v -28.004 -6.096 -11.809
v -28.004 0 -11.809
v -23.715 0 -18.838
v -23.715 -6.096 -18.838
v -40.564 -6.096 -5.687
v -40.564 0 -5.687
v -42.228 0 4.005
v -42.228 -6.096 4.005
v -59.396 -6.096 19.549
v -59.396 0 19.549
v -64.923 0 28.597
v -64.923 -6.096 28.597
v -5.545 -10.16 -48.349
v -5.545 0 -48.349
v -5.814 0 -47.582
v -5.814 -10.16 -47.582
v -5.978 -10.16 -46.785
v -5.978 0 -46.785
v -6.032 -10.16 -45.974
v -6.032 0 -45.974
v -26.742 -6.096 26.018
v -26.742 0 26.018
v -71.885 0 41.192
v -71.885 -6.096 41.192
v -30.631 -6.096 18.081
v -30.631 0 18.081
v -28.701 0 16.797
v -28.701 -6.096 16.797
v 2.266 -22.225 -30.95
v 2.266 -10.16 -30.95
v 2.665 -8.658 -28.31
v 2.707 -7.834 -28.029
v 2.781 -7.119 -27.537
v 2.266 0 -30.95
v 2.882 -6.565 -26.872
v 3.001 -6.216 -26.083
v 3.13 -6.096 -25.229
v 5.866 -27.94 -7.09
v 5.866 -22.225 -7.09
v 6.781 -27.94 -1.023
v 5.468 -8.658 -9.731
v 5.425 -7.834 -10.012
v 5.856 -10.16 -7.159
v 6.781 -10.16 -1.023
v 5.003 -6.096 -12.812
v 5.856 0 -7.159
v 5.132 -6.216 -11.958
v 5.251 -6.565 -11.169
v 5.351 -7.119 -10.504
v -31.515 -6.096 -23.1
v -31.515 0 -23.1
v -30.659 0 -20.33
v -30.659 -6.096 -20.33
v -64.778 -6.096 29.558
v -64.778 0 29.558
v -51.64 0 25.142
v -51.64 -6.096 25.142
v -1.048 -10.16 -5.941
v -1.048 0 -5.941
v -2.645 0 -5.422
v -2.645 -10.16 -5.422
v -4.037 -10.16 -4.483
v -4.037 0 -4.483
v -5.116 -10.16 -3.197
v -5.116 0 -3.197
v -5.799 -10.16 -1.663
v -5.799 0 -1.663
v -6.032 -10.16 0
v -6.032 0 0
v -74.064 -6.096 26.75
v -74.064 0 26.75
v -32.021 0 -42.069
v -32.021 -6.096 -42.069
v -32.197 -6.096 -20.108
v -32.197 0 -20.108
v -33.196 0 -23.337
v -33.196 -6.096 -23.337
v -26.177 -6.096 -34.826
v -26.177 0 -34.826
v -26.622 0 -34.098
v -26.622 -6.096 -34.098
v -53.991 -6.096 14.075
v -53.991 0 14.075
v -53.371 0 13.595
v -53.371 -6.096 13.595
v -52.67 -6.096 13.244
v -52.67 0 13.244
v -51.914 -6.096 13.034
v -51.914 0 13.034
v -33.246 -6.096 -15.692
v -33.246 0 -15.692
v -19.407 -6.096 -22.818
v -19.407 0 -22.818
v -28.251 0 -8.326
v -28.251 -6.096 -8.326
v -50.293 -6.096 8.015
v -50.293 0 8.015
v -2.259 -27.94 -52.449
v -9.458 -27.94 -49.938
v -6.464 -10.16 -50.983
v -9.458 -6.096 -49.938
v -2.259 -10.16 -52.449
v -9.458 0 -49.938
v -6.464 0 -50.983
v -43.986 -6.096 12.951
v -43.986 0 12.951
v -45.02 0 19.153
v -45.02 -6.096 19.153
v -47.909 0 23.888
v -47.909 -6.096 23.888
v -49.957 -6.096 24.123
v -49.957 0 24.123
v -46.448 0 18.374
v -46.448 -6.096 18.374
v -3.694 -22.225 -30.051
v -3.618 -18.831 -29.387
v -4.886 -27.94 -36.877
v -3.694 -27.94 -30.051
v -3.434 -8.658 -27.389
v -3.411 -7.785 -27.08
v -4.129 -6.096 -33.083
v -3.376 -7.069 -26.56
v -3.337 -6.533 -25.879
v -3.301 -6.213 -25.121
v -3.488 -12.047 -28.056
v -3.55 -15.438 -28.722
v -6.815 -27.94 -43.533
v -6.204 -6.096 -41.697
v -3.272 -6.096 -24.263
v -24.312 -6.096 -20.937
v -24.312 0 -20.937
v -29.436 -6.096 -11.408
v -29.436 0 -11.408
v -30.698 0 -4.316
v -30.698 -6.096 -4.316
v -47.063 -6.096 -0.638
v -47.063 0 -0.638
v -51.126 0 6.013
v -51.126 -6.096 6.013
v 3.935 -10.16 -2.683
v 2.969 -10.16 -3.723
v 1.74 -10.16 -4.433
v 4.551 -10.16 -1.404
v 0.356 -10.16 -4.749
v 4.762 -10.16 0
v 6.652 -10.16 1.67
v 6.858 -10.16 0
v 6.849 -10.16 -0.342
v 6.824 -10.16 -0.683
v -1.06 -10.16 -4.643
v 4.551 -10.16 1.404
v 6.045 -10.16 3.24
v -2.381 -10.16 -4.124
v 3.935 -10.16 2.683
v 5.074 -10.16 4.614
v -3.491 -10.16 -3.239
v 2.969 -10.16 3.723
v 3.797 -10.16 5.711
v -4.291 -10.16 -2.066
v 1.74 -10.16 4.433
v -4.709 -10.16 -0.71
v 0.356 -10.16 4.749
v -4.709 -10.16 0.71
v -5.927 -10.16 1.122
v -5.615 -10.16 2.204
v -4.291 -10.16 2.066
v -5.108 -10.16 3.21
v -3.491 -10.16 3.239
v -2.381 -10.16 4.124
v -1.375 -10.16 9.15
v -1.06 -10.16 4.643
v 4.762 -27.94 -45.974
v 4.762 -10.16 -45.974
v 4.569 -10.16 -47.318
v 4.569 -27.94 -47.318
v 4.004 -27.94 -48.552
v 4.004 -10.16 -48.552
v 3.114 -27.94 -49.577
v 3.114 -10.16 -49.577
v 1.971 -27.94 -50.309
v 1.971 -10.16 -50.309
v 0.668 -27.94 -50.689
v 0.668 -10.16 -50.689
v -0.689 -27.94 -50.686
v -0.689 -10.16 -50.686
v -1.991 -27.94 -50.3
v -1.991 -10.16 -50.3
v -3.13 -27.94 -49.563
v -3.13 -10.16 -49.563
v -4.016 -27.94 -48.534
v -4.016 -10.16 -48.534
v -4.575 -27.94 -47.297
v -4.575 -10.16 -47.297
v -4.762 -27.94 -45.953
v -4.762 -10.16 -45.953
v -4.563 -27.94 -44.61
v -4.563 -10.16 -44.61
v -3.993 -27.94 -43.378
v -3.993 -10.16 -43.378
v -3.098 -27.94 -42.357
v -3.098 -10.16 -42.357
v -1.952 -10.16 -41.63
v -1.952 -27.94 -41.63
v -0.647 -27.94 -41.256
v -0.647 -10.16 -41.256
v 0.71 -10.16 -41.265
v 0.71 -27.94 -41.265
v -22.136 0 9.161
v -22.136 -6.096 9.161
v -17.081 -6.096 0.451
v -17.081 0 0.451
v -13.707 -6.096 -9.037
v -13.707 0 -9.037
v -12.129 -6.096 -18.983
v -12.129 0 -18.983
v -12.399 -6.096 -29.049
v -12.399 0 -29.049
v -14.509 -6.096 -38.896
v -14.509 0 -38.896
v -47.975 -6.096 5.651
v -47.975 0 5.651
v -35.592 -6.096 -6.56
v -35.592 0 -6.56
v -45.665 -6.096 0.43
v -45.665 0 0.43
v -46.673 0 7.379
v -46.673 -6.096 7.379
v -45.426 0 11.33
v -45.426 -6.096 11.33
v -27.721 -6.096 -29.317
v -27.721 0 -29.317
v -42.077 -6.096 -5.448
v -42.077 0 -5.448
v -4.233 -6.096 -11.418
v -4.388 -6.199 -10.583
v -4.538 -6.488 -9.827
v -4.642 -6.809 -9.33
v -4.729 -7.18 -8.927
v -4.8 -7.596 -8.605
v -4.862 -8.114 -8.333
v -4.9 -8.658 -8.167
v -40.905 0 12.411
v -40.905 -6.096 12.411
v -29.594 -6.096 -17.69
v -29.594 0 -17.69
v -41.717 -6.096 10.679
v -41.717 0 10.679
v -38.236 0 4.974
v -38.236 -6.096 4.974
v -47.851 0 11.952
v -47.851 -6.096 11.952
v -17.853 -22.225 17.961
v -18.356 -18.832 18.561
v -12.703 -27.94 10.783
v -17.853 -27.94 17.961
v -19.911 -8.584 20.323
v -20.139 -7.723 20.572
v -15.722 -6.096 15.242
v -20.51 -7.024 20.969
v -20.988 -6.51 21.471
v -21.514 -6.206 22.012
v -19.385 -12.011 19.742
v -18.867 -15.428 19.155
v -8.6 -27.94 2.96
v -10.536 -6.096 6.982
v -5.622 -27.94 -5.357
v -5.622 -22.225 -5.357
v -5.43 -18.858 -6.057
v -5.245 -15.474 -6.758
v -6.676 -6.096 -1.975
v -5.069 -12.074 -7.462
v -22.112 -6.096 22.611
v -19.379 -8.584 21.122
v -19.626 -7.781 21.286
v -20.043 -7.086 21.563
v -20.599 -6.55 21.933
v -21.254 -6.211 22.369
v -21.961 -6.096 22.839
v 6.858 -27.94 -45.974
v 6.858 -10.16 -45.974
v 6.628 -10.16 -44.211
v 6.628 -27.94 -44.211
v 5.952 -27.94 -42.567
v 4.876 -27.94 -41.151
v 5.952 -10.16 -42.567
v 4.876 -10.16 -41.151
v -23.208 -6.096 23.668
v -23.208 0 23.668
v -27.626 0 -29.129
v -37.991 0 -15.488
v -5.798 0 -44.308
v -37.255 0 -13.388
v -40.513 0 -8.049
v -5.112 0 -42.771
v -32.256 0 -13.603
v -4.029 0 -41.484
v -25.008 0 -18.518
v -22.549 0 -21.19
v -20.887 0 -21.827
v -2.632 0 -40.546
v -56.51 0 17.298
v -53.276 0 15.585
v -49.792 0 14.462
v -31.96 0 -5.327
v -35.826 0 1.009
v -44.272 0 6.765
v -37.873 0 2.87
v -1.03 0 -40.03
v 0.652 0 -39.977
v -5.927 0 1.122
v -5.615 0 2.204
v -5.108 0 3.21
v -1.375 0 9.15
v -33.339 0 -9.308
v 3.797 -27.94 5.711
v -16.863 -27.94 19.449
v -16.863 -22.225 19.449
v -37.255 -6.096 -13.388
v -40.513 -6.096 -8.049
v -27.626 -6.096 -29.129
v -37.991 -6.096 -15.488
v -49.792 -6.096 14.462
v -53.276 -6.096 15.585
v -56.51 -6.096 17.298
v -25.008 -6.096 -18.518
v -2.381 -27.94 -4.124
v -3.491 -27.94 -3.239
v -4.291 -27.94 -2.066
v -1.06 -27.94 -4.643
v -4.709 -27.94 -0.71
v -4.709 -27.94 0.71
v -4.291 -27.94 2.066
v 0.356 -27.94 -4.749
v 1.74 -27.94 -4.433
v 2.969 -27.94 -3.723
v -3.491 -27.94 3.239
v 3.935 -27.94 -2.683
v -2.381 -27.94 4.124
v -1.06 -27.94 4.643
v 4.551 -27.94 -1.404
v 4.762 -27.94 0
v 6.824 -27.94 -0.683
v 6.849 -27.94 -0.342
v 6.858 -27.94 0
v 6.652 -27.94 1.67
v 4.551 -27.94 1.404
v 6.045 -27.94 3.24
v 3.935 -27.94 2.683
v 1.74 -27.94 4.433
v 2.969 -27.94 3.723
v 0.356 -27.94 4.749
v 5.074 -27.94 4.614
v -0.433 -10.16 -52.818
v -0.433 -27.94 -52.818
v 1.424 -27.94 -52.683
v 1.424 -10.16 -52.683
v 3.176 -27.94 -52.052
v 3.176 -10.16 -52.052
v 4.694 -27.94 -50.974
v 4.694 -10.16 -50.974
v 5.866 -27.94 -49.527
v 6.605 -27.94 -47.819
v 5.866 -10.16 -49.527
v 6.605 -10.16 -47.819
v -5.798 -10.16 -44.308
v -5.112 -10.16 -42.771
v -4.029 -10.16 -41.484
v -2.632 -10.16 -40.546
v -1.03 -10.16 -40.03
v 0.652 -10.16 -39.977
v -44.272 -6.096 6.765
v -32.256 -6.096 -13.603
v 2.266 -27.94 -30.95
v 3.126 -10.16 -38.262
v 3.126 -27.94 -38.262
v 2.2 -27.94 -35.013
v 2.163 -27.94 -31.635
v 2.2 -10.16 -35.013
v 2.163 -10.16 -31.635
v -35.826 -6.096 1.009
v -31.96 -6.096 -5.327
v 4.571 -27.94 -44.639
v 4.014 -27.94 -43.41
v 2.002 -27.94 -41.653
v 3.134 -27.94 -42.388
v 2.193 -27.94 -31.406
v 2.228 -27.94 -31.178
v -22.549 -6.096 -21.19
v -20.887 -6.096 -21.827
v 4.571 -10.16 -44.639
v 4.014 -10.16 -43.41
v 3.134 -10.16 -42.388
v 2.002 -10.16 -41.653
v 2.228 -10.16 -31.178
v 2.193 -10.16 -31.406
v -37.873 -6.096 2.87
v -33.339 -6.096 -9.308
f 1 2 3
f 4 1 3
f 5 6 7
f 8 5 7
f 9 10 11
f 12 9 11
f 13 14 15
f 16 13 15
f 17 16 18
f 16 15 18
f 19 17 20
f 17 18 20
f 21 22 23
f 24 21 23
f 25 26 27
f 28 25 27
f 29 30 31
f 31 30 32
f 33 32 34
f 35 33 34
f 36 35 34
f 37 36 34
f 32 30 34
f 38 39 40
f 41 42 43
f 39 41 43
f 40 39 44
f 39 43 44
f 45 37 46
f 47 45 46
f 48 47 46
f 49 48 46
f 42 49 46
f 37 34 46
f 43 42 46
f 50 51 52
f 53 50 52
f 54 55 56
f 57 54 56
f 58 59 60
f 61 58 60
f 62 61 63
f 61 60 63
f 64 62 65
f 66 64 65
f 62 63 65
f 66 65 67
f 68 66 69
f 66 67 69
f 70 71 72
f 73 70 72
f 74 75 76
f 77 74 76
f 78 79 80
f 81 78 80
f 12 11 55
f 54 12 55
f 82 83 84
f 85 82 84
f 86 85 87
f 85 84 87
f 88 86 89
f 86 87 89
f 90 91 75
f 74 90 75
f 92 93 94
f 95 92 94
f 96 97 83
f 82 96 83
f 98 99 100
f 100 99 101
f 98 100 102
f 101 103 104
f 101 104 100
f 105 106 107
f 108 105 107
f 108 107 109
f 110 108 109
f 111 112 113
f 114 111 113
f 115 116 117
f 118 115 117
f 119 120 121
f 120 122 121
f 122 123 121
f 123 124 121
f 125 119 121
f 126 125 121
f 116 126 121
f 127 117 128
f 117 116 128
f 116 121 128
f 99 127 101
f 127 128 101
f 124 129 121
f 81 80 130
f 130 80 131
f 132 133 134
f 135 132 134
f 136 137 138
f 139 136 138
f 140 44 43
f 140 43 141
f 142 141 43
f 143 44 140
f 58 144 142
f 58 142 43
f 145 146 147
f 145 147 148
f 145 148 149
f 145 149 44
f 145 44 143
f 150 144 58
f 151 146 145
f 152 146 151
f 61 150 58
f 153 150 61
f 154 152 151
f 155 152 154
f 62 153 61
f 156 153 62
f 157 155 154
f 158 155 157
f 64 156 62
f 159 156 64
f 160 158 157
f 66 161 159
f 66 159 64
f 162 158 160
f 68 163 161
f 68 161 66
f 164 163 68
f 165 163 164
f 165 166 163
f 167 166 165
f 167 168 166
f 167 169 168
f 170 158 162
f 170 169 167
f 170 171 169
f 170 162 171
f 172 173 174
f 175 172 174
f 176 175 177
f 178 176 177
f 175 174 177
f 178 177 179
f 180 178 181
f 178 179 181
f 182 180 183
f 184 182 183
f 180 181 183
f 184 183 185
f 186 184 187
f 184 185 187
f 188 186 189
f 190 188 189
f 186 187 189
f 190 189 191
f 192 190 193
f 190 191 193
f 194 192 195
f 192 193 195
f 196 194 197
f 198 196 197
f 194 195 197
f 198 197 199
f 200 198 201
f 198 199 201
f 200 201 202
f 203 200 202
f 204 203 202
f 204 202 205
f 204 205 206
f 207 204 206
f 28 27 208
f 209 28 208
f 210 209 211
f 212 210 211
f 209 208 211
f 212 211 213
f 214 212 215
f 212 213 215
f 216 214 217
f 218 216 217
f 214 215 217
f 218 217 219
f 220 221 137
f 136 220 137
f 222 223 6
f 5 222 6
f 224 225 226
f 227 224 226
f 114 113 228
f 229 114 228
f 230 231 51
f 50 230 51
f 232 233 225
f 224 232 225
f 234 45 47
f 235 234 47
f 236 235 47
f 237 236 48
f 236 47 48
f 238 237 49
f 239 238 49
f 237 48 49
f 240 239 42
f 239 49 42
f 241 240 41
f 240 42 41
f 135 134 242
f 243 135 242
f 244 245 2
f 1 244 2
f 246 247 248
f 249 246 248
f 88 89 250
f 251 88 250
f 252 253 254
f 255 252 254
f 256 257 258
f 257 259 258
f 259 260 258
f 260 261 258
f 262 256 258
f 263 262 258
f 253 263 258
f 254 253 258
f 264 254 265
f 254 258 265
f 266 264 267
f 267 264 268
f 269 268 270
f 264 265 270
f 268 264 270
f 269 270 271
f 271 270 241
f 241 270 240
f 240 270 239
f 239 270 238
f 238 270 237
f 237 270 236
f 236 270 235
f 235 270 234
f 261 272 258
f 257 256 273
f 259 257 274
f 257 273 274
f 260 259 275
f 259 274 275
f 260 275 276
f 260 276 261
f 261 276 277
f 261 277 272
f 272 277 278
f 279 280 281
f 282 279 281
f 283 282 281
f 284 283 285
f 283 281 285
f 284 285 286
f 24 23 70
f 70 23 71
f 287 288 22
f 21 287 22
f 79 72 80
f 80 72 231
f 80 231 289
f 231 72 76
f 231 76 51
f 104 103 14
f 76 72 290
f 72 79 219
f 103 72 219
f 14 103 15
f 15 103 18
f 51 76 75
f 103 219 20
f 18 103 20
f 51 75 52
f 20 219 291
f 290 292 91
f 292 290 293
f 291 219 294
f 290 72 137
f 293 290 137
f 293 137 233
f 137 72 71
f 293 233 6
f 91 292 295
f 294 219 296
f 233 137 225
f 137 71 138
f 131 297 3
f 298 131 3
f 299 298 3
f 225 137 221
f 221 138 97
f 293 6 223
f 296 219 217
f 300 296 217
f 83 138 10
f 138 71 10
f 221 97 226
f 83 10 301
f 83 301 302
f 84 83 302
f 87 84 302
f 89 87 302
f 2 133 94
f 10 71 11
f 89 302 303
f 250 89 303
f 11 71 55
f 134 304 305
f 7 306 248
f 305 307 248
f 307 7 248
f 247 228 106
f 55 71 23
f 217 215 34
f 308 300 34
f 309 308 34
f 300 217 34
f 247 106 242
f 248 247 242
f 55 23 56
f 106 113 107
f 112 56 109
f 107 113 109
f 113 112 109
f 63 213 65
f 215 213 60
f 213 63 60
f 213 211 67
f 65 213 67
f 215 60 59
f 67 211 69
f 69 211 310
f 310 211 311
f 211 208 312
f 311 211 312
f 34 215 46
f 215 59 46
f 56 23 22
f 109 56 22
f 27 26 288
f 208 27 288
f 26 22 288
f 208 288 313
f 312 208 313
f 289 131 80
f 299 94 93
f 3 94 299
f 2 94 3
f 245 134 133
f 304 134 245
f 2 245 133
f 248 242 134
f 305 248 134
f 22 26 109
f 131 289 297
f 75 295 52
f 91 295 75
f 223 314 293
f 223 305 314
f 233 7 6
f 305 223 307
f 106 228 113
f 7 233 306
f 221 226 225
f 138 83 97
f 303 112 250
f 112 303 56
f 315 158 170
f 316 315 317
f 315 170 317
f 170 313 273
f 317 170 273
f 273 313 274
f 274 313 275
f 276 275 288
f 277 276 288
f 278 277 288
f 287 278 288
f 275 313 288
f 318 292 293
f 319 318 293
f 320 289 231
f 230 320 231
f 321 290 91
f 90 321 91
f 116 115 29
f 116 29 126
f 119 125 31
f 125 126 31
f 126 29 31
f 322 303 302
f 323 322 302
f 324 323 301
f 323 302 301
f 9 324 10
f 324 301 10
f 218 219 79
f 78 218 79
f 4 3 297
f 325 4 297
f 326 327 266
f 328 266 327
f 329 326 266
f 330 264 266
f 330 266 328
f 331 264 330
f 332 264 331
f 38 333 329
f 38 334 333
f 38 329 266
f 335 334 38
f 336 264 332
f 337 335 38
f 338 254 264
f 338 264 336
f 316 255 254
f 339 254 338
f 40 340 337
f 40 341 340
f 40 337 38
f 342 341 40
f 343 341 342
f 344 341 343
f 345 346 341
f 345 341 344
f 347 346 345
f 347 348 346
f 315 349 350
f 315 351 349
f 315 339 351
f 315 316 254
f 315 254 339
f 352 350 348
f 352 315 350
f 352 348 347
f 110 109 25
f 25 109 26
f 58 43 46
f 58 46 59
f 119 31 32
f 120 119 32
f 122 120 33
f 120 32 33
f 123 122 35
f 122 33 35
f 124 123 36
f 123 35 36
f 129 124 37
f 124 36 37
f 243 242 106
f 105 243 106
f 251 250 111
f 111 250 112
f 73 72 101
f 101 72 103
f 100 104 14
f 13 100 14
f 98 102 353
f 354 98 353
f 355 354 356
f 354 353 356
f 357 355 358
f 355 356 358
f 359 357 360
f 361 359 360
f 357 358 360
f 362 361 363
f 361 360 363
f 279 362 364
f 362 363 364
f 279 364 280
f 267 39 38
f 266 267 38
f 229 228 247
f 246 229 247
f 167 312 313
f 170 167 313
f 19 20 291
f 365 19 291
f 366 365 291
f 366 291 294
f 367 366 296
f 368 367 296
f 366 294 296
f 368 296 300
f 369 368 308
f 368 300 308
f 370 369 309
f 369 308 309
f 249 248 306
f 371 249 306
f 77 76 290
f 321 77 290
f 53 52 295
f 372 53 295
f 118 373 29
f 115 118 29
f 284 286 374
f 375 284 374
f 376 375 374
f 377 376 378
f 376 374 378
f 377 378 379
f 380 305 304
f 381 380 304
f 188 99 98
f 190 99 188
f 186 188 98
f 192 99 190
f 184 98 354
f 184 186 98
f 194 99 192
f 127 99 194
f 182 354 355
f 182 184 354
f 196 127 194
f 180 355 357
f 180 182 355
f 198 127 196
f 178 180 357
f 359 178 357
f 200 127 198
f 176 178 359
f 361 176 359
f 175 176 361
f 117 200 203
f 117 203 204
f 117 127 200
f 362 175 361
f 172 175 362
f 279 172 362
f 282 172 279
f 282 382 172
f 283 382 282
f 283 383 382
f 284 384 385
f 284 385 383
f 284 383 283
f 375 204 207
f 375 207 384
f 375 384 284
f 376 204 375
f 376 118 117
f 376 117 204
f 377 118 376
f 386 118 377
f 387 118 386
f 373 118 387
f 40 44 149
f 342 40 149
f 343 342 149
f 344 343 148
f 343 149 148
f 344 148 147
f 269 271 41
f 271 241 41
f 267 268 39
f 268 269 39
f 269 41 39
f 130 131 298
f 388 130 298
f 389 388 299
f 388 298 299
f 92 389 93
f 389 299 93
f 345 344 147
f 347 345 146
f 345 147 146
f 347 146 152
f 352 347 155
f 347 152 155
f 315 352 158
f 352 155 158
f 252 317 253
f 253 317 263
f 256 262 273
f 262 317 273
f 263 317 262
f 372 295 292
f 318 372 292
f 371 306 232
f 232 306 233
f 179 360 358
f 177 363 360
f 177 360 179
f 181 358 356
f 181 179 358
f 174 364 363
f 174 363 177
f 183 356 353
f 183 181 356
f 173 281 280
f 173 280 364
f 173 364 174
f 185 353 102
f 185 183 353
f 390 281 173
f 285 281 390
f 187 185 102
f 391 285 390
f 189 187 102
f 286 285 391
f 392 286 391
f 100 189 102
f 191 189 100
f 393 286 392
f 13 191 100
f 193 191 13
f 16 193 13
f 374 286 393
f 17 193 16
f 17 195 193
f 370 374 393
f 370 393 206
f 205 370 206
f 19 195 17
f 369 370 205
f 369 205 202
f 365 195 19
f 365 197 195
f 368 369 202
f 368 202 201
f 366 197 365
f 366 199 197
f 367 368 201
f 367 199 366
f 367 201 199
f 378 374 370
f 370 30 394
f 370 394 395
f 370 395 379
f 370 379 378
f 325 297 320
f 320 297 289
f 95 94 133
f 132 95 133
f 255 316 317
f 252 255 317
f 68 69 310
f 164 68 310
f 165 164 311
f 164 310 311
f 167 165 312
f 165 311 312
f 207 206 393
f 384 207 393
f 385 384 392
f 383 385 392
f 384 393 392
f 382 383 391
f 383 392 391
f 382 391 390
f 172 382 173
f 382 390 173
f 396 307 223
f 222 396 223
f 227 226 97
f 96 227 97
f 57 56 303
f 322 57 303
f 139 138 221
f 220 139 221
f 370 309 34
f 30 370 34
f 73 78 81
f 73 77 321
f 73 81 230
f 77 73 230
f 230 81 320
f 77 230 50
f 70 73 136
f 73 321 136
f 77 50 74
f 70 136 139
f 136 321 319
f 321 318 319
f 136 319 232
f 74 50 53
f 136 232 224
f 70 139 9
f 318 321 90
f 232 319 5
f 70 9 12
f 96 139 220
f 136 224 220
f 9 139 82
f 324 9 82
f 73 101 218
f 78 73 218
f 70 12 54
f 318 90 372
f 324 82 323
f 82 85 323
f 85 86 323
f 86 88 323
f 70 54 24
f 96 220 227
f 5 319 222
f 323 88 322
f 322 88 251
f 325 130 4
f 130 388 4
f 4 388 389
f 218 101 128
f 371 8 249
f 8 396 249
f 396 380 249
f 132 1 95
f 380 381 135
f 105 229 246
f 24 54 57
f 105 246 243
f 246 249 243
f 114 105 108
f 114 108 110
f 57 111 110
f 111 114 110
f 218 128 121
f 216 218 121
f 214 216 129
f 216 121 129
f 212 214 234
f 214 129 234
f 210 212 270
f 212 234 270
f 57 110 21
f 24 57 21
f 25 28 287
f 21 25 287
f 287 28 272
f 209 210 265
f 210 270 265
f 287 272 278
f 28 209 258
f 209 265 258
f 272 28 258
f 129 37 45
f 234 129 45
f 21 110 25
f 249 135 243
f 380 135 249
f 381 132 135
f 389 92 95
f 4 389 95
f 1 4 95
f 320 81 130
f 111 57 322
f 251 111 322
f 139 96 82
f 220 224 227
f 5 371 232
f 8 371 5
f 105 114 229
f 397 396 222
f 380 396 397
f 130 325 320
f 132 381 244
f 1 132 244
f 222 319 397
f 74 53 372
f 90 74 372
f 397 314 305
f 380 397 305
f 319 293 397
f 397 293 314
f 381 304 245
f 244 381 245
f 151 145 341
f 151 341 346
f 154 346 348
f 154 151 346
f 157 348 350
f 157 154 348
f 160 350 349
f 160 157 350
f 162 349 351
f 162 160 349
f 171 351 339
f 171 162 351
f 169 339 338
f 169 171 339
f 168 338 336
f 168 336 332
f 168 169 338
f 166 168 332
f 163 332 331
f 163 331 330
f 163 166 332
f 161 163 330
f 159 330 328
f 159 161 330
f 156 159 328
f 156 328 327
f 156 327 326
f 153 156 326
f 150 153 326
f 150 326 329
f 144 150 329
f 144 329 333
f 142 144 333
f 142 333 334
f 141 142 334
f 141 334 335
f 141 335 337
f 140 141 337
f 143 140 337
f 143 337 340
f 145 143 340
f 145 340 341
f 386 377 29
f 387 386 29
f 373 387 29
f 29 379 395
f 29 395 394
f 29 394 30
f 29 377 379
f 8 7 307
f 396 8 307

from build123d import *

# Parameters (mm, degrees)
F1_DEPTH = 6.096
F0_R     = 4.7625
F2_DEPTH = 27.94
F3_R     = 4.7625
F4_DEPTH = 10.16
F6_DEPTH = 25.4
F8_DEPTH = 25.4


# Not quite as in the source:
# - ends of sketch curves that miss each other by under 0.0002 mm in the source are joined


with BuildPart() as f1:
    # F0 (on Front) → F1 (new body)
    with BuildSketch(Plane.XZ):
        with BuildLine():
            Line((-32.0214776694, -42.0687062724), (-9.4581565389, -49.9383443038))
            ThreePointArc((-9.4581565389, -49.9383443038), (-4.3291887886, -10.8925785557), (-23.2082019061, 23.6683964993))
            Line((-23.2082019061, 23.6683964993), (-26.7419346225, 26.0181961702))
            Line((-26.7419346225, 26.0181961702), (-71.8849952467, 41.1920125155))
            Line((-71.8849952467, 41.1920125155), (-74.0636416555, 26.7504224083))
            Line((-74.0636416555, 26.7504224083), (-32.0214776694, -42.0687062724))
        make_face()
        with BuildLine():
            Line((-64.9229101249, 28.5970199237), (-64.7778869932, 29.5583345343))
            Line((-64.7778869932, 29.5583345343), (-51.6396961272, 25.1422295438))
            Line((-51.6396961272, 25.1422295438), (-52.8126453404, 31.9232999149))
            Line((-52.8126453404, 31.9232999149), (-47.9094184009, 23.888381259))
            Line((-47.9094184009, 23.888381259), (-30.6306738726, 18.0805230295))
            Line((-30.6306738726, 18.0805230295), (-28.7005674828, 16.7970746978))
            ThreePointArc((-28.7005674828, 16.7970746978), (-13.7073707997, -9.0370384003), (-14.5091616555, -38.895947921))
            Line((-14.5091616555, -38.895947921), (-26.1770067548, -34.8264354141))
            Line((-26.1770067548, -34.8264354141), (-26.621853962, -34.0982617358))
            Line((-26.621853962, -34.0982617358), (-26.6298627107, -34.143893025))
            Line((-26.6298627107, -34.143893025), (-33.2056261218, -23.3681886247))
            Line((-33.2056261218, -23.3681886247), (-33.1959865258, -23.3370155967))
            Line((-33.1959865258, -23.3370155967), (-37.9909119068, -15.4881668334))
            Line((-37.9909119068, -15.4881668334), (-38.0149602805, -15.4871320814))
            Line((-38.0149602805, -15.4871320814), (-47.058612277, -0.6672983188))
            Line((-47.058612277, -0.6672983188), (-47.0628196228, -0.6382941035))
            Line((-47.0628196228, -0.6382941035), (-51.126360936, 6.0133466785))
            Line((-51.126360936, 6.0133466785), (-51.1360904547, 6.0144657282))
            Line((-51.1360904547, 6.0144657282), (-59.3956089847, 19.549339872))
            Line((-59.3956089847, 19.549339872), (-64.9229101249, 28.5970199237))
        make_face(mode=Mode.SUBTRACT)
        Polygon((-52.8126453404, 31.9232999149), (-51.6396961272, 25.1422295438), (-47.9094184009, 23.888381259), align=None)
        with BuildLine():
            Line((-47.9094184009, 23.888381259), (-51.6396961272, 25.1422295438))
            Line((-51.6396961272, 25.1422295438), (-49.7922885775, 14.4619712189))
            ThreePointArc((-49.7922885775, 14.4619712189), (-54.9303785287, 16.3705840809), (-59.3956089847, 19.549339872))
            Line((-59.3956089847, 19.549339872), (-51.126360936, 6.0133466785))
            Line((-51.126360936, 6.0133466785), (-47.9751295821, 5.650904873))
            Line((-47.9751295821, 5.650904873), (-47.0628196228, -0.6382941035))
            Line((-47.0628196228, -0.6382941035), (-37.9909119068, -15.4881668334))
            Line((-37.9909119068, -15.4881668334), (-33.2459525636, -15.6923326562))
            Line((-33.2459525636, -15.6923326562), (-32.1973996311, -20.1077332485))
            Line((-32.1973996311, -20.1077332485), (-33.1959865258, -23.3370155967))
            Line((-33.1959865258, -23.3370155967), (-26.621853962, -34.0982617358))
            Line((-26.621853962, -34.0982617358), (-24.3119723824, -20.937295163))
            ThreePointArc((-24.3119723824, -20.937295163), (-21.7000142249, -21.4617233548), (-19.4071664649, -22.8182628838))
            Line((-19.4071664649, -22.8182628838), (-28.2510661679, -8.3257632317))
            Line((-28.2510661679, -8.3257632317), (-29.4364036114, -11.4075290833))
            Line((-29.4364036114, -11.4075290833), (-30.6980011467, -4.3159705476))
            Line((-30.6980011467, -4.3159705476), (-40.9051855797, 12.4105439777))
            Line((-40.9051855797, 12.4105439777), (-43.9856683867, 12.9511995939))
            Line((-43.9856683867, 12.9511995939), (-45.0197701825, 19.1531143287))
            Line((-45.0197701825, 19.1531143287), (-47.9094184009, 23.888381259))
        make_face()
        Polygon((-27.6263519566, -29.1291445767), (-27.7209985719, -29.3173462139), (-31.515369772, -23.0995096098), (-30.6589124026, -20.3298531285), (-32.2562875166, -13.6033915394), (-37.2546680921, -13.3883215232), (-40.5128122557, -8.0492002372), (-33.339172628, -9.3082459116), (-35.8258069544, 1.0090607264), (-31.9595713249, -5.326540128), (-29.5939579287, -17.6900622221), (-28.0038996356, -11.8086998658), (-23.7145710116, -18.8376232681), (-25.0080493325, -18.5184438136), align=None, mode=Mode.SUBTRACT)
        Polygon((-42.2277428728, 4.0048563327), (-37.873417838, 2.8701371118), (-35.5923646419, -6.559544504), (-40.5642118698, -5.6869354699), align=None, mode=Mode.SUBTRACT)
        with BuildLine():
            Line((-46.4479878328, 18.3739303005), (-45.4261892475, 11.3299486454))
            Line((-45.4261892475, 11.3299486454), (-41.7172805078, 10.6789979777))
            Line((-41.7172805078, 10.6789979777), (-38.2356426654, 4.9736375696))
            Line((-38.2356426654, 4.9736375696), (-44.2720463387, 6.7649825752))
            Line((-44.2720463387, 6.7649825752), (-42.0774568025, -5.4481170908))
            Line((-42.0774568025, -5.4481170908), (-45.6646201437, 0.4301679667))
            Line((-45.6646201437, 0.4301679667), (-46.6726678742, 7.3793552358))
            Line((-46.6726678742, 7.3793552358), (-50.293044526, 8.0147676345))
            Line((-50.293044526, 8.0147676345), (-53.9911477917, 14.0748499614))
            ThreePointArc((-53.9911477917, 14.0748499614), (-53.0287307311, 13.4025301345), (-51.9140375876, 13.0341285278))
            Line((-51.9140375876, 13.0341285278), (-47.8512962747, 11.9523388206))
            Line((-47.8512962747, 11.9523388206), (-49.9565863421, 24.1234711571))
            Line((-49.9565863421, 24.1234711571), (-46.4479878328, 18.3739303005))
        make_face(mode=Mode.SUBTRACT)
        Polygon((-37.9909119068, -15.4881668334), (-47.0628196228, -0.6382941035), (-47.058612277, -0.6672983188), (-38.0149602805, -15.4871320814), align=None)
        Polygon((-26.621853962, -34.0982617358), (-33.1959865258, -23.3370155967), (-33.2056261218, -23.3681886247), (-26.6298627107, -34.143893025), align=None)
        Polygon((-51.126360936, 6.0133466785), (-59.3956089847, 19.549339872), (-51.1360904547, 6.0144657282), align=None)
    extrude(amount=F1_DEPTH)

    # F0 (on Front) → F2 (join)
    with BuildSketch(Plane.XZ):
        with BuildLine():
            ThreePointArc((-2.2585047177, -52.4494397874), (-6.6570778662, -44.3261291668), (1.0230165746, -39.1927316018))
            Line((1.0230165746, -39.1927316018), (2.1631019861, -31.6354491837))
            ThreePointArc((2.1631019861, -31.6354491837), (2.210106245, -31.292191847), (2.2664563284, -30.9503444137))
            Line((2.2664563284, -30.9503444137), (6.781268444, -1.0230162708))
            ThreePointArc((6.781268444, -1.0230162708), (-6.2699855461, -2.7783889669), (3.7973937006, 5.7106886698))
            Line((3.7973937006, 5.7106886698), (-23.2082019061, 23.6683964993))
            ThreePointArc((-23.2082019061, 23.6683964993), (-4.3291887886, -10.8925785557), (-9.4581565389, -49.9383443038))
            Line((-9.4581565389, -49.9383443038), (-2.2585047177, -52.4494397874))
        make_face()
        with BuildLine():
            ThreePointArc((3.7973937006, 5.7106886698), (-6.2699855461, -2.7783889669), (6.781268444, -1.0230162708))
            ThreePointArc((6.781268444, -1.0230162708), (6.8387902069, -0.5129449342), (6.858, 0))
            ThreePointArc((6.858, 0), (6.0446128908, 3.239570805), (3.7973937006, 5.7106886698))
        make_face()
        Circle(F0_R, mode=Mode.SUBTRACT)
        with BuildLine():
            Line((2.1631019861, -31.6354491837), (1.0230165746, -39.1927316018))
            ThreePointArc((1.0230165746, -39.1927316018), (3.1078508959, -39.8606190362), (4.8759932113, -41.1514639241))
            ThreePointArc((4.8759932113, -41.1514639241), (2.5546345778, -36.6685406241), (2.1631019861, -31.6354491837))
        make_face()
        with BuildLine():
            ThreePointArc((4.8759932113, -41.1514639241), (3.1078508959, -39.8606190362), (1.0230165746, -39.1927316018))
            ThreePointArc((1.0230165746, -39.1927316018), (-6.6570778662, -44.3261291668), (-2.2585047177, -52.4494397874))
            ThreePointArc((-2.2585047177, -52.4494397874), (3.9713561063, -51.5651085374), (6.858, -45.974))
            ThreePointArc((6.858, -45.974), (6.3431744987, -43.3670283318), (4.8759932113, -41.1514639241))
        make_face()
        with BuildLine():
            ThreePointArc((0.7104281768, -41.2647858346), (3.6100429666, -42.8677166857), (4.7625, -45.974))
            ThreePointArc((4.7625, -45.974), (-3.6100429666, -49.0802833143), (0.7104281768, -41.2647858346))
        make_face(mode=Mode.SUBTRACT)
    extrude(amount=F2_DEPTH)

    # F3 (on face) → F4 (cut)
    with BuildSketch(Plane(origin=(0, 0, 0), x_dir=(-1, 0, 0), z_dir=(0, 1, 0))):
        with BuildLine():
            ThreePointArc((1.0479234506, -5.9407838449), (4.6212906458, -3.8774642509), (6.0325, 0))
            ThreePointArc((6.0325, 0), (5.7966808552, 1.6701937951), (5.1076604432, 3.2098070109))
            ThreePointArc((5.1076604432, 3.2098070109), (-5.5141755069, 2.4464105806), (1.0479234506, -5.9407838449))
        make_face()
        Circle(F3_R, mode=Mode.SUBTRACT)
        with BuildLine():
            ThreePointArc((1.0479234506, -5.9407838449), (-5.5141755069, 2.4464105806), (5.1076604432, 3.2098070109))
            Line((5.1076604432, 3.2098070109), (1.3747032796, 9.1499391047))
            Line((1.3747032796, 9.1499391047), (-3.7973937006, 5.7106886698))
            ThreePointArc((-3.7973937006, 5.7106886698), (-6.2699855461, 2.7783889669), (-6.781268444, -1.0230162708))
            Line((-6.781268444, -1.0230162708), (-5.8556681398, -7.158541587))
            Line((-5.8556681398, -7.158541587), (1.0479234506, -5.9407838449))
        make_face()
        with BuildLine():
            Line((-0.6517694903, -39.9768129276), (-2.2664563284, -30.9503444137))
            ThreePointArc((-2.2664563284, -30.9503444137), (-2.46420133, -36.3340905871), (-4.8759932113, -41.1514639241))
            ThreePointArc((-4.8759932113, -41.1514639241), (-5.7986098468, -49.6357329019), (2.2585047177, -52.4494397874))
            Line((2.2585047177, -52.4494397874), (6.4636236378, -50.9827778723))
            Line((6.4636236378, -50.9827778723), (5.5451457053, -48.3493768874))
            ThreePointArc((5.5451457053, -48.3493768874), (-4.8488389859, -49.5628461571), (-0.6517694903, -39.9768129276))
        make_face()
        with BuildLine():
            ThreePointArc((6.0325, -45.974), (4.0286012957, -41.483852135), (-0.6517694903, -39.9768129276))
            ThreePointArc((-0.6517694903, -39.9768129276), (-4.8488389859, -49.5628461571), (5.5451457053, -48.3493768874))
            ThreePointArc((5.5451457053, -48.3493768874), (5.9094055419, -47.1864283036), (6.0325, -45.974))
        make_face()
        with Locations((0, -45.974)):
            Circle(F3_R, mode=Mode.SUBTRACT)
        with Locations((0, -45.974)):
            Circle(F3_R)
    extrude(amount=-F4_DEPTH, mode=Mode.SUBTRACT)

    # F5 (on face) → F6 (cut)
    with BuildSketch(Plane(origin=(6.7812683982, 0, -1.0230165746), x_dir=(0, 1, 0), z_dir=(0.9888113733, 0, -0.1491712707))):
        with BuildLine():
            Line((-27.94, -6.1359623937), (-27.94, -30.2659623937))
            Line((-27.94, -30.2659623937), (-22.225, -30.2659623937))
            Line((-22.225, -30.2659623937), (-8.6577684612, -27.5952475238))
            ThreePointArc((-8.6577684612, -27.5952475238), (-6.81869138, -26.496664003), (-6.096, -24.4800313066))
            Line((-6.096, -24.4800313066), (-6.096, -18.2009623937))
            Line((-6.096, -18.2009623937), (-6.096, -11.9218934807))
            ThreePointArc((-6.096, -11.9218934807), (-6.81869138, -9.9052607843), (-8.6577684612, -8.8066772635))
            Line((-8.6577684612, -8.8066772635), (-22.225, -6.1359623937))
            Line((-22.225, -6.1359623937), (-27.94, -6.1359623937))
        make_face()
    extrude(amount=-F6_DEPTH, mode=Mode.SUBTRACT)

    # F7 (on face) → F8 (cut)
    with BuildSketch(Plane(origin=(3.7973937006, 0, 5.7106886698), x_dir=(0.8327046763, 0, -0.5537173667), z_dir=(0.5537173667, 0, 0.8327046763))):
        with BuildLine():
            Line((-32.4311804374, -6.096), (-32.4311804374, -27.94))
            Line((-32.4311804374, -27.94), (-24.8111804374, -27.94))
            Line((-24.8111804374, -27.94), (-24.8111804374, -22.225))
            Line((-24.8111804374, -22.225), (-27.8331080585, -8.5842698128))
            ThreePointArc((-27.8331080585, -8.5842698128), (-28.9454580871, -6.7950160194), (-30.9329510626, -6.096))
            Line((-30.9329510626, -6.096), (-32.4311804374, -6.096))
        make_face()
    extrude(amount=-F8_DEPTH, mode=Mode.SUBTRACT)


solid = f1.part
